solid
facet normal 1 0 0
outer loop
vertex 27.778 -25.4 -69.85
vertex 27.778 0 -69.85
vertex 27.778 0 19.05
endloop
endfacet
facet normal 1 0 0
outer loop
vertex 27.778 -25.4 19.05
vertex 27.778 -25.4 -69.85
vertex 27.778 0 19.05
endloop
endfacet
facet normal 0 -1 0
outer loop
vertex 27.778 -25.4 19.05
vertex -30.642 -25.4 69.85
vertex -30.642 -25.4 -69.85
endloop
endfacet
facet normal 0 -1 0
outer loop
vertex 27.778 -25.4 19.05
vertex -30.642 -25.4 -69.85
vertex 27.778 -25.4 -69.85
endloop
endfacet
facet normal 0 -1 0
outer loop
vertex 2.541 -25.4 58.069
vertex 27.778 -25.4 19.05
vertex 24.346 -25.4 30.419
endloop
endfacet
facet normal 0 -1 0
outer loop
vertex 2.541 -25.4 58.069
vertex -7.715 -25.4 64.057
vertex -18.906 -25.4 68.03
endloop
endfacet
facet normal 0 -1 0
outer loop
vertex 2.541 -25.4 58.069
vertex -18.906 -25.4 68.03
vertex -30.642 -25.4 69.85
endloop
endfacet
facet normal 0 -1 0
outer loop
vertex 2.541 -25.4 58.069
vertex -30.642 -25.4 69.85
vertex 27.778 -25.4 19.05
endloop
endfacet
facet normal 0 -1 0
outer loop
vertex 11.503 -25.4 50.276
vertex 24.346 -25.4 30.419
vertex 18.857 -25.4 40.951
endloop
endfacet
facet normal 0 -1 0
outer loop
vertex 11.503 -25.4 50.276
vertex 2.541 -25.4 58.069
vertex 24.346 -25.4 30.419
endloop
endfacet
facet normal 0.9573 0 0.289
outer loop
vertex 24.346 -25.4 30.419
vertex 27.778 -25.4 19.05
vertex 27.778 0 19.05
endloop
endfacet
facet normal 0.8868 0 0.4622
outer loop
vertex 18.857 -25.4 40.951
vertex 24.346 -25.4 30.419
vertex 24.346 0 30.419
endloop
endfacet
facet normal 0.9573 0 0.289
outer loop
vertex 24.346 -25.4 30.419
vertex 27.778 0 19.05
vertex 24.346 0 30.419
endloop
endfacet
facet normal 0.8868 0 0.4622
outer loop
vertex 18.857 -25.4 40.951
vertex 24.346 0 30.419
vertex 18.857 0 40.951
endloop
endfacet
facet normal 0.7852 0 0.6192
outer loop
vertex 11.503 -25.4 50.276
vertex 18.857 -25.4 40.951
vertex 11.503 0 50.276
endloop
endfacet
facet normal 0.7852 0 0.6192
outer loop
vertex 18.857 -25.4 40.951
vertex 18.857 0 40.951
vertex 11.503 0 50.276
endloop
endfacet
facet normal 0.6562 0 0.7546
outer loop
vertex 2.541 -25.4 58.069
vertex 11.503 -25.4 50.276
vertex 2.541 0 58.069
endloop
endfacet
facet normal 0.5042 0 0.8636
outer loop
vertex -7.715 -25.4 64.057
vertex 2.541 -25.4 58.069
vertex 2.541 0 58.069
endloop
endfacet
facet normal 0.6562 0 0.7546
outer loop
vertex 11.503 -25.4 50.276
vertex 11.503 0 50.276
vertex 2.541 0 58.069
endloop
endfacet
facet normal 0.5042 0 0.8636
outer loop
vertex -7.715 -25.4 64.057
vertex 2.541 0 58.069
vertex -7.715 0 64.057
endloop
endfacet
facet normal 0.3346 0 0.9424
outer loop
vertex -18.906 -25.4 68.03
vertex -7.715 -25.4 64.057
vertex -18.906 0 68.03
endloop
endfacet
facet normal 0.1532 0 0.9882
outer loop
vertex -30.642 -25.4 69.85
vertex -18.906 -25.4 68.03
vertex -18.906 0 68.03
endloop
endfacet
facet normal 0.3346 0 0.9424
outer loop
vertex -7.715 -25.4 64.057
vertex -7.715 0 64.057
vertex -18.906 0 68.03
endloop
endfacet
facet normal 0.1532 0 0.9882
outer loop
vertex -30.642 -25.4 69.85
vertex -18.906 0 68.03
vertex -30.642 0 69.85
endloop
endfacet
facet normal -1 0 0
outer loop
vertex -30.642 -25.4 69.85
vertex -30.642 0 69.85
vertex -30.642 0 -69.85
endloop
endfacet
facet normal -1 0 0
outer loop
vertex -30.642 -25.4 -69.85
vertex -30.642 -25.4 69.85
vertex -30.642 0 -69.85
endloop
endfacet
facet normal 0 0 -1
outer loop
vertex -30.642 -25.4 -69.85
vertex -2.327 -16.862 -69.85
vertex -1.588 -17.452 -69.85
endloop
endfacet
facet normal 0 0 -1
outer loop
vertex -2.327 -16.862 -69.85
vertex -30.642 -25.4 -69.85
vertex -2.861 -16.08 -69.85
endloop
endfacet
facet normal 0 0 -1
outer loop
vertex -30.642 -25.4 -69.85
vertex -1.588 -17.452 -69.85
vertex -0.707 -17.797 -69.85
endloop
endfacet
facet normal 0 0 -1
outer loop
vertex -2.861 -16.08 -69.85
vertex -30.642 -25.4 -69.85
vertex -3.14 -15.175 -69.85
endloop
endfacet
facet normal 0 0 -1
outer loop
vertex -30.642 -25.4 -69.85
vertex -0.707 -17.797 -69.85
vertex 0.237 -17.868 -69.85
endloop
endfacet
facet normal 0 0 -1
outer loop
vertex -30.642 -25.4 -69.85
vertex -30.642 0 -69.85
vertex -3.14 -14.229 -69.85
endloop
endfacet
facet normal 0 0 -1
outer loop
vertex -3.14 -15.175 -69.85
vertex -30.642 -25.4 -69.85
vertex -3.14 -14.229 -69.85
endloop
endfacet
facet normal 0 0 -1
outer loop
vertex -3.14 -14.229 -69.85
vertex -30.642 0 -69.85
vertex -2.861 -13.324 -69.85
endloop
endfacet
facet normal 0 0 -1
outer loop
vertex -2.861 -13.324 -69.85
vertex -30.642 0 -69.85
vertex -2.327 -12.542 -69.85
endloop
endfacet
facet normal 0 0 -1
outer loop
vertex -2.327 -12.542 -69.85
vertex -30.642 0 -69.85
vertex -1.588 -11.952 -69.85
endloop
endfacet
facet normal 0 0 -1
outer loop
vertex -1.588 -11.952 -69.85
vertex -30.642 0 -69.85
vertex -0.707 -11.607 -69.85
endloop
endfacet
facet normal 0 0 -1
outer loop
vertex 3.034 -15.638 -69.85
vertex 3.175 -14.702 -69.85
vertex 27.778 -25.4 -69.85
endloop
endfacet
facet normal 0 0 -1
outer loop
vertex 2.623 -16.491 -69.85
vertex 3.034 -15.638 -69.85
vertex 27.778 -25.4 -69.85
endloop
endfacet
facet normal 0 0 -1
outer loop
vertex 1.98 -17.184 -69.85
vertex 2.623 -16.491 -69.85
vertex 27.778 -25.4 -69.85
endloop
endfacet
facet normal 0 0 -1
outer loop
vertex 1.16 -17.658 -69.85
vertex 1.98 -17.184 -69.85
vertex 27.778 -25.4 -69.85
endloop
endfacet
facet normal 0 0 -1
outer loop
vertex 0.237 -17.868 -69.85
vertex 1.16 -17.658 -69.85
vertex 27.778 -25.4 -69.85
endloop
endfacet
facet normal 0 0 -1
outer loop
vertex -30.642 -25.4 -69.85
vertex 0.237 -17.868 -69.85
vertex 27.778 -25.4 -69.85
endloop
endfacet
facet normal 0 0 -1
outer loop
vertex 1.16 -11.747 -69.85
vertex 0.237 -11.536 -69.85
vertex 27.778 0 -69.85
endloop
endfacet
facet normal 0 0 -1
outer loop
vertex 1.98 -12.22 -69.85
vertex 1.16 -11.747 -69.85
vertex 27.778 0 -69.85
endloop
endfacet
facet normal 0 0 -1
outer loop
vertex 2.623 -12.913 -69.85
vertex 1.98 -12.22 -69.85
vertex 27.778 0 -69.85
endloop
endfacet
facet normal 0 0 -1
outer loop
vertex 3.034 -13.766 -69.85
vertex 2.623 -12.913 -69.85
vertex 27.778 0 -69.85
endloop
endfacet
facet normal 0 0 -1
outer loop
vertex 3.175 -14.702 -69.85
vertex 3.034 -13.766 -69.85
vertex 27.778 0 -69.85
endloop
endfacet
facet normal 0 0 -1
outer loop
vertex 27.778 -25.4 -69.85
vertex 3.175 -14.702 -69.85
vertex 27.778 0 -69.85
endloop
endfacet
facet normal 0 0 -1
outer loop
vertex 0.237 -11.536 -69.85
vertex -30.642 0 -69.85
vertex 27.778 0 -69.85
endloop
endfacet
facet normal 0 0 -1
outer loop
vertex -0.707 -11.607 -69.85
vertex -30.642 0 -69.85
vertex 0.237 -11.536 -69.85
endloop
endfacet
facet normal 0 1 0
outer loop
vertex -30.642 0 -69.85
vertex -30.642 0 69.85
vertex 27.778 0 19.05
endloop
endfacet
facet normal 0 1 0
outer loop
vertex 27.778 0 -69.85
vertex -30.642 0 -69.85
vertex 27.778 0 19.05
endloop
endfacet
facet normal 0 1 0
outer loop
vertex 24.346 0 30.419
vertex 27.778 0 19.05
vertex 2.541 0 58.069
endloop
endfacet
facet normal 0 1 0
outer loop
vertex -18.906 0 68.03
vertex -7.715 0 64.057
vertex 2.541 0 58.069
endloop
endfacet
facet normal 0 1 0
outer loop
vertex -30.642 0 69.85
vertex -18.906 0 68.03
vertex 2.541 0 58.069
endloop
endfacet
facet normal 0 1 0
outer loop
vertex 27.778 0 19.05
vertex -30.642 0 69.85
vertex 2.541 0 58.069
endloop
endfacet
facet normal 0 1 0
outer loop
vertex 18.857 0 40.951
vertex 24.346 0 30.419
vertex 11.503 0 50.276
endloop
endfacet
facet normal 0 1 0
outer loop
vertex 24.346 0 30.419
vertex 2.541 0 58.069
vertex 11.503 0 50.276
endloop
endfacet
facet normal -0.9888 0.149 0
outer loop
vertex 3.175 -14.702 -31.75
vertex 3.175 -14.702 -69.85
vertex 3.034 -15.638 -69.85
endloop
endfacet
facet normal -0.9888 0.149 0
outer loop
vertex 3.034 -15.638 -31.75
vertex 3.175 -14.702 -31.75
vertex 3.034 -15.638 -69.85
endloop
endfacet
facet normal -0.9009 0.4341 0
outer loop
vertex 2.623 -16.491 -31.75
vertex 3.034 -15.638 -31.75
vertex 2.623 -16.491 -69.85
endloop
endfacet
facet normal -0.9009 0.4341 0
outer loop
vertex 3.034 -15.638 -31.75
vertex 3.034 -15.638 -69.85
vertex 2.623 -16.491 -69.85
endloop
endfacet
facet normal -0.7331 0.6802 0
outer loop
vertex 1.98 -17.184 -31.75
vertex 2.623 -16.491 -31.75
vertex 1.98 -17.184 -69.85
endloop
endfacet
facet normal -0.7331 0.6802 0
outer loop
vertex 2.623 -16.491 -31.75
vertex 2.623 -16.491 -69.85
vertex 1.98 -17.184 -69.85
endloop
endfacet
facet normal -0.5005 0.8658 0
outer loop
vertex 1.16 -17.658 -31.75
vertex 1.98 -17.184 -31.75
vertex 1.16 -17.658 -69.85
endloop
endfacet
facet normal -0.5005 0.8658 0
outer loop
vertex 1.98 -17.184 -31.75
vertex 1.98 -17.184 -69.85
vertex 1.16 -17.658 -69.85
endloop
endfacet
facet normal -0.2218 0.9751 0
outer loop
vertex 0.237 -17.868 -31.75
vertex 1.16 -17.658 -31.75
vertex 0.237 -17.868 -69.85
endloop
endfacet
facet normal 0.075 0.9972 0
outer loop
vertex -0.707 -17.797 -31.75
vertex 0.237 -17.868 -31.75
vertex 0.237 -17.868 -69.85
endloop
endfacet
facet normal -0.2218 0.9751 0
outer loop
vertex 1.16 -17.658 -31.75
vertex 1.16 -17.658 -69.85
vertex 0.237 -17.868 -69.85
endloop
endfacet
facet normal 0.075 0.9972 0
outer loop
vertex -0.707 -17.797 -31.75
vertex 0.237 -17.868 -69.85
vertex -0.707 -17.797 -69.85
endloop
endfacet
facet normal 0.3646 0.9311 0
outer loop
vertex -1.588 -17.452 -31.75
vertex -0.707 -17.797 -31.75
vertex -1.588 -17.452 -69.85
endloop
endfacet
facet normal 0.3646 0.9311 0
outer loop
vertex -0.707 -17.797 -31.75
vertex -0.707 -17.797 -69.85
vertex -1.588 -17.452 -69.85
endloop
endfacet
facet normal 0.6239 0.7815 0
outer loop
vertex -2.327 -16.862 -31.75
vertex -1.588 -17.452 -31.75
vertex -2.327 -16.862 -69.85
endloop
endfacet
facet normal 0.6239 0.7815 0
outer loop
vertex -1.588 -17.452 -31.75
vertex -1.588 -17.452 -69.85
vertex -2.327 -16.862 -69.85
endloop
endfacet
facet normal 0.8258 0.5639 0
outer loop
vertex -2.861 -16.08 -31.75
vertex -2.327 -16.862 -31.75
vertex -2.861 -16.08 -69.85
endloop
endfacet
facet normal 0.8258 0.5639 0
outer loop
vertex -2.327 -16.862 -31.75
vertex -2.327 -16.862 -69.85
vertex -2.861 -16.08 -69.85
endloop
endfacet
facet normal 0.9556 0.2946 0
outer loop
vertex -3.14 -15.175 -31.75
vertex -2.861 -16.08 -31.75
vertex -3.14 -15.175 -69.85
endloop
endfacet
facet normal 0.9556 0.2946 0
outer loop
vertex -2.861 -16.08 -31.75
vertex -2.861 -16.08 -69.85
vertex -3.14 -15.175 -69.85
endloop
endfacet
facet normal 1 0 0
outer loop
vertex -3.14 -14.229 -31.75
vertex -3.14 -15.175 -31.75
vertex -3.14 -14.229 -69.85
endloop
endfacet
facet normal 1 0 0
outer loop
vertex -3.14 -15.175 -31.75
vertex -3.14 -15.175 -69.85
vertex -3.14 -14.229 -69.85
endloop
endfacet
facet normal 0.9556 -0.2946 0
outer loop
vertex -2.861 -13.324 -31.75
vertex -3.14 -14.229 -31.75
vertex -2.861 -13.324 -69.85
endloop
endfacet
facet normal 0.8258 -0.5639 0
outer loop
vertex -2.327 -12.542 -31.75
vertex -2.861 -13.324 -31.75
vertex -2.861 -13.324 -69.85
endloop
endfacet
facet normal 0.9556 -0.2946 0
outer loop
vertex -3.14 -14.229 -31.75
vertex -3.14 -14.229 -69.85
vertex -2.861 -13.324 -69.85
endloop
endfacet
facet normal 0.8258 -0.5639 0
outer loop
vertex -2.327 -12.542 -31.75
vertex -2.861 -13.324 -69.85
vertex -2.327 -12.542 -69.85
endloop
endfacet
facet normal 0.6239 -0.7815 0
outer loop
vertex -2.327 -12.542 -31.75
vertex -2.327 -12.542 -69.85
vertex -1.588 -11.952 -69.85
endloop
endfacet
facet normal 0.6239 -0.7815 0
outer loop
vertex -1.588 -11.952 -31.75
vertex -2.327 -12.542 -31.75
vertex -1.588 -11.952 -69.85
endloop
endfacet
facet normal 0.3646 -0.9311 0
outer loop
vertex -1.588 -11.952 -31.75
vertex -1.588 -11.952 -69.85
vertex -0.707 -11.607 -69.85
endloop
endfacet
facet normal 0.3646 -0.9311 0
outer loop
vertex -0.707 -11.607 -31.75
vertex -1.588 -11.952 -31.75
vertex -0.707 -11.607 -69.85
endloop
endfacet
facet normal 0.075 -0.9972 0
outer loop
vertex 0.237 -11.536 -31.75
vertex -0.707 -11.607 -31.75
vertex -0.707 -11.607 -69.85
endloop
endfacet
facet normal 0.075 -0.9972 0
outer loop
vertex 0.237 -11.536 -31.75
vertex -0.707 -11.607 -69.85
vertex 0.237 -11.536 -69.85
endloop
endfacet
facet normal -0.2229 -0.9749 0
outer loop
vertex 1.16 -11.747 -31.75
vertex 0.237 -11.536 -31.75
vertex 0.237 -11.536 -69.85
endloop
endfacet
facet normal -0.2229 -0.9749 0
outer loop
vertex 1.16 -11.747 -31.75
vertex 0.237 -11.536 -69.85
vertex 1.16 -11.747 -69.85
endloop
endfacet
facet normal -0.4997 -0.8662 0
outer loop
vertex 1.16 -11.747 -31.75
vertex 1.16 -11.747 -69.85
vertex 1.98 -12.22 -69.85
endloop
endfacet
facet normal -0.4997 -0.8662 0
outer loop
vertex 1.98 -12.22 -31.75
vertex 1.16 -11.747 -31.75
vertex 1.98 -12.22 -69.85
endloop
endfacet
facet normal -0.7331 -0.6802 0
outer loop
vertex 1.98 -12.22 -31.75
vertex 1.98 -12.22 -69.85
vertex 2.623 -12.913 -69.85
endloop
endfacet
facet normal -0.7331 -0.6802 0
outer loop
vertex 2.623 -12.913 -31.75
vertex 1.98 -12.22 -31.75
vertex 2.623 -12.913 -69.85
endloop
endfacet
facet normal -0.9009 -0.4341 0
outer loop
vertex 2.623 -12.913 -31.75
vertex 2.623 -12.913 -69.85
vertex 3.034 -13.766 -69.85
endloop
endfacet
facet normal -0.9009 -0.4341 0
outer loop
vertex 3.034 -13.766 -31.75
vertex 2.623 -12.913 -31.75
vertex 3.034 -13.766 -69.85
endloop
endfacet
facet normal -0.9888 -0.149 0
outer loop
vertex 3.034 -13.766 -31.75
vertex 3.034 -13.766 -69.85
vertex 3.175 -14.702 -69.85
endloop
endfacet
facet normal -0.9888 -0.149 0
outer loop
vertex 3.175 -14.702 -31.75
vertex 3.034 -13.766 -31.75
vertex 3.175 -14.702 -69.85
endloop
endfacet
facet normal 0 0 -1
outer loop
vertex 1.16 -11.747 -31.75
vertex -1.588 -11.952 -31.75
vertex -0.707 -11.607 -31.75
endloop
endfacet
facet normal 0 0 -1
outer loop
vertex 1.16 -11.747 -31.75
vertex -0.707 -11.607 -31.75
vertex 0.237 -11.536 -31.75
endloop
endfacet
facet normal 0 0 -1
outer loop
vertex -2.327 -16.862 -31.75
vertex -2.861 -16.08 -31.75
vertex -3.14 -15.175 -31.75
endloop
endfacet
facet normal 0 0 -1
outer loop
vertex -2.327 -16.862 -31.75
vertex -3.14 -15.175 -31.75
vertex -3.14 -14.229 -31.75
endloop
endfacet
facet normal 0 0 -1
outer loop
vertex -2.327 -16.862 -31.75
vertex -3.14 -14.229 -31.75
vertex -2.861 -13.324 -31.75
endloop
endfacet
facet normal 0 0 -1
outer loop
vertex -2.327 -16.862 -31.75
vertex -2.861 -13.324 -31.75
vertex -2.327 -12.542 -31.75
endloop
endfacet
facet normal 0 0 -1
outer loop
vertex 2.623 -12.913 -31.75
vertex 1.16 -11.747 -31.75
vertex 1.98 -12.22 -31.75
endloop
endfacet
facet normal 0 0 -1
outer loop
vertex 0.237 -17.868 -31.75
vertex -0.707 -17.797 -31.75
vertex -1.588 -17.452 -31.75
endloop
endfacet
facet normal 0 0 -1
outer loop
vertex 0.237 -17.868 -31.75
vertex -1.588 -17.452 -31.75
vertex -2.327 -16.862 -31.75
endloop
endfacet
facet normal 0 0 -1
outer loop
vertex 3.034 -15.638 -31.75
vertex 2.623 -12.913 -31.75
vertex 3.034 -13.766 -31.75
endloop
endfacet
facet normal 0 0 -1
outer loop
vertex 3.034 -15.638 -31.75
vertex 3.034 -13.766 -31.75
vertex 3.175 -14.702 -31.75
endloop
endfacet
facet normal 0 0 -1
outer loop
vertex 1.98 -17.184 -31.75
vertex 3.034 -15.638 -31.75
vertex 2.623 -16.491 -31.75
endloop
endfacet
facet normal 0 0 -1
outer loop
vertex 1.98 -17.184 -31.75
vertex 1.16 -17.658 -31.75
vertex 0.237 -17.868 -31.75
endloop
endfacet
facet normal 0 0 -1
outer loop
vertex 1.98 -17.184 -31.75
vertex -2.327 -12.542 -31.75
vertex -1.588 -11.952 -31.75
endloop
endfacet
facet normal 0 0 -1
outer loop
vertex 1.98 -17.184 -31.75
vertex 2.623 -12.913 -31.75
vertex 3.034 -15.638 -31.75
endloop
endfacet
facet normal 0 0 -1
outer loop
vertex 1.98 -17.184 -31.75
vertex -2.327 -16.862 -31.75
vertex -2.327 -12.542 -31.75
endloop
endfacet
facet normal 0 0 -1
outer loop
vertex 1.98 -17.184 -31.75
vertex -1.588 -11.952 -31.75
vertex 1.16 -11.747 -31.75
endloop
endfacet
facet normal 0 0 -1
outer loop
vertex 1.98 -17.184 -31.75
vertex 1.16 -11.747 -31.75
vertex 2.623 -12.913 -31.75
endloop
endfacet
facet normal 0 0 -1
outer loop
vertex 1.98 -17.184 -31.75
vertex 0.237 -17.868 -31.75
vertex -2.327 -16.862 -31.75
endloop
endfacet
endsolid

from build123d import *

# Parameters (mm, degrees)
F1_DEPTH = 25.4
F2_R     = 31.75
F3_DEPTH = 25.4
F2_R_2   = 3.175
F5_DEPTH = 12.7
F6_DEPTH = 50.8


with BuildPart() as f1:
    # F0 (on Front) → F1 (new body)
    with BuildSketch(Plane.XZ):
        with BuildLine():
            ThreePointArc((27.7778723818, 19.05), (7.2048117222, 54.3824802414), (-30.6421276182, 69.85))
            Line((-30.6421276182, 69.85), (-30.6421276182, -69.85))
            Line((-30.6421276182, -69.85), (27.7778723818, -69.85))
            Line((27.7778723818, -69.85), (27.7778723818, 19.05))
        make_face()
    extrude(amount=F1_DEPTH)

    # F2 (on face) → F3, piece 2 (join)
    with BuildSketch(Plane(origin=(0, 0, -69.85), x_dir=(1, 0, 0), z_dir=(0, 0, -1))):
        with Locations((0, 14.7020313889)):
            Circle(F2_R_2)
    extrude(amount=F3_DEPTH)

    # F5 (cut): a face of the model
    f5_faces = [f1.faces().sort_by_distance(p)[0] for p in [
        (0, -14.7020313889, -95.25),
    ]]
    extrude(f5_faces, amount=-F5_DEPTH, mode=Mode.SUBTRACT)

    # F6 (cut): a face of the model
    f6_faces = [f1.faces().sort_by_distance(p)[0] for p in [
        (0, -14.7020313889, -82.55),
    ]]
    extrude(f6_faces, amount=-F6_DEPTH, mode=Mode.SUBTRACT)


with BuildPart() as f3:
    # F2 (on face) → F3 (new body)
    with BuildSketch(Plane(origin=(0, 0, -69.85), x_dir=(1, 0, 0), z_dir=(0, 0, -1))):
        with Locations((0, 116.4425893424)):
            Circle(F2_R)
    extrude(amount=F3_DEPTH)


solid = f1.part
